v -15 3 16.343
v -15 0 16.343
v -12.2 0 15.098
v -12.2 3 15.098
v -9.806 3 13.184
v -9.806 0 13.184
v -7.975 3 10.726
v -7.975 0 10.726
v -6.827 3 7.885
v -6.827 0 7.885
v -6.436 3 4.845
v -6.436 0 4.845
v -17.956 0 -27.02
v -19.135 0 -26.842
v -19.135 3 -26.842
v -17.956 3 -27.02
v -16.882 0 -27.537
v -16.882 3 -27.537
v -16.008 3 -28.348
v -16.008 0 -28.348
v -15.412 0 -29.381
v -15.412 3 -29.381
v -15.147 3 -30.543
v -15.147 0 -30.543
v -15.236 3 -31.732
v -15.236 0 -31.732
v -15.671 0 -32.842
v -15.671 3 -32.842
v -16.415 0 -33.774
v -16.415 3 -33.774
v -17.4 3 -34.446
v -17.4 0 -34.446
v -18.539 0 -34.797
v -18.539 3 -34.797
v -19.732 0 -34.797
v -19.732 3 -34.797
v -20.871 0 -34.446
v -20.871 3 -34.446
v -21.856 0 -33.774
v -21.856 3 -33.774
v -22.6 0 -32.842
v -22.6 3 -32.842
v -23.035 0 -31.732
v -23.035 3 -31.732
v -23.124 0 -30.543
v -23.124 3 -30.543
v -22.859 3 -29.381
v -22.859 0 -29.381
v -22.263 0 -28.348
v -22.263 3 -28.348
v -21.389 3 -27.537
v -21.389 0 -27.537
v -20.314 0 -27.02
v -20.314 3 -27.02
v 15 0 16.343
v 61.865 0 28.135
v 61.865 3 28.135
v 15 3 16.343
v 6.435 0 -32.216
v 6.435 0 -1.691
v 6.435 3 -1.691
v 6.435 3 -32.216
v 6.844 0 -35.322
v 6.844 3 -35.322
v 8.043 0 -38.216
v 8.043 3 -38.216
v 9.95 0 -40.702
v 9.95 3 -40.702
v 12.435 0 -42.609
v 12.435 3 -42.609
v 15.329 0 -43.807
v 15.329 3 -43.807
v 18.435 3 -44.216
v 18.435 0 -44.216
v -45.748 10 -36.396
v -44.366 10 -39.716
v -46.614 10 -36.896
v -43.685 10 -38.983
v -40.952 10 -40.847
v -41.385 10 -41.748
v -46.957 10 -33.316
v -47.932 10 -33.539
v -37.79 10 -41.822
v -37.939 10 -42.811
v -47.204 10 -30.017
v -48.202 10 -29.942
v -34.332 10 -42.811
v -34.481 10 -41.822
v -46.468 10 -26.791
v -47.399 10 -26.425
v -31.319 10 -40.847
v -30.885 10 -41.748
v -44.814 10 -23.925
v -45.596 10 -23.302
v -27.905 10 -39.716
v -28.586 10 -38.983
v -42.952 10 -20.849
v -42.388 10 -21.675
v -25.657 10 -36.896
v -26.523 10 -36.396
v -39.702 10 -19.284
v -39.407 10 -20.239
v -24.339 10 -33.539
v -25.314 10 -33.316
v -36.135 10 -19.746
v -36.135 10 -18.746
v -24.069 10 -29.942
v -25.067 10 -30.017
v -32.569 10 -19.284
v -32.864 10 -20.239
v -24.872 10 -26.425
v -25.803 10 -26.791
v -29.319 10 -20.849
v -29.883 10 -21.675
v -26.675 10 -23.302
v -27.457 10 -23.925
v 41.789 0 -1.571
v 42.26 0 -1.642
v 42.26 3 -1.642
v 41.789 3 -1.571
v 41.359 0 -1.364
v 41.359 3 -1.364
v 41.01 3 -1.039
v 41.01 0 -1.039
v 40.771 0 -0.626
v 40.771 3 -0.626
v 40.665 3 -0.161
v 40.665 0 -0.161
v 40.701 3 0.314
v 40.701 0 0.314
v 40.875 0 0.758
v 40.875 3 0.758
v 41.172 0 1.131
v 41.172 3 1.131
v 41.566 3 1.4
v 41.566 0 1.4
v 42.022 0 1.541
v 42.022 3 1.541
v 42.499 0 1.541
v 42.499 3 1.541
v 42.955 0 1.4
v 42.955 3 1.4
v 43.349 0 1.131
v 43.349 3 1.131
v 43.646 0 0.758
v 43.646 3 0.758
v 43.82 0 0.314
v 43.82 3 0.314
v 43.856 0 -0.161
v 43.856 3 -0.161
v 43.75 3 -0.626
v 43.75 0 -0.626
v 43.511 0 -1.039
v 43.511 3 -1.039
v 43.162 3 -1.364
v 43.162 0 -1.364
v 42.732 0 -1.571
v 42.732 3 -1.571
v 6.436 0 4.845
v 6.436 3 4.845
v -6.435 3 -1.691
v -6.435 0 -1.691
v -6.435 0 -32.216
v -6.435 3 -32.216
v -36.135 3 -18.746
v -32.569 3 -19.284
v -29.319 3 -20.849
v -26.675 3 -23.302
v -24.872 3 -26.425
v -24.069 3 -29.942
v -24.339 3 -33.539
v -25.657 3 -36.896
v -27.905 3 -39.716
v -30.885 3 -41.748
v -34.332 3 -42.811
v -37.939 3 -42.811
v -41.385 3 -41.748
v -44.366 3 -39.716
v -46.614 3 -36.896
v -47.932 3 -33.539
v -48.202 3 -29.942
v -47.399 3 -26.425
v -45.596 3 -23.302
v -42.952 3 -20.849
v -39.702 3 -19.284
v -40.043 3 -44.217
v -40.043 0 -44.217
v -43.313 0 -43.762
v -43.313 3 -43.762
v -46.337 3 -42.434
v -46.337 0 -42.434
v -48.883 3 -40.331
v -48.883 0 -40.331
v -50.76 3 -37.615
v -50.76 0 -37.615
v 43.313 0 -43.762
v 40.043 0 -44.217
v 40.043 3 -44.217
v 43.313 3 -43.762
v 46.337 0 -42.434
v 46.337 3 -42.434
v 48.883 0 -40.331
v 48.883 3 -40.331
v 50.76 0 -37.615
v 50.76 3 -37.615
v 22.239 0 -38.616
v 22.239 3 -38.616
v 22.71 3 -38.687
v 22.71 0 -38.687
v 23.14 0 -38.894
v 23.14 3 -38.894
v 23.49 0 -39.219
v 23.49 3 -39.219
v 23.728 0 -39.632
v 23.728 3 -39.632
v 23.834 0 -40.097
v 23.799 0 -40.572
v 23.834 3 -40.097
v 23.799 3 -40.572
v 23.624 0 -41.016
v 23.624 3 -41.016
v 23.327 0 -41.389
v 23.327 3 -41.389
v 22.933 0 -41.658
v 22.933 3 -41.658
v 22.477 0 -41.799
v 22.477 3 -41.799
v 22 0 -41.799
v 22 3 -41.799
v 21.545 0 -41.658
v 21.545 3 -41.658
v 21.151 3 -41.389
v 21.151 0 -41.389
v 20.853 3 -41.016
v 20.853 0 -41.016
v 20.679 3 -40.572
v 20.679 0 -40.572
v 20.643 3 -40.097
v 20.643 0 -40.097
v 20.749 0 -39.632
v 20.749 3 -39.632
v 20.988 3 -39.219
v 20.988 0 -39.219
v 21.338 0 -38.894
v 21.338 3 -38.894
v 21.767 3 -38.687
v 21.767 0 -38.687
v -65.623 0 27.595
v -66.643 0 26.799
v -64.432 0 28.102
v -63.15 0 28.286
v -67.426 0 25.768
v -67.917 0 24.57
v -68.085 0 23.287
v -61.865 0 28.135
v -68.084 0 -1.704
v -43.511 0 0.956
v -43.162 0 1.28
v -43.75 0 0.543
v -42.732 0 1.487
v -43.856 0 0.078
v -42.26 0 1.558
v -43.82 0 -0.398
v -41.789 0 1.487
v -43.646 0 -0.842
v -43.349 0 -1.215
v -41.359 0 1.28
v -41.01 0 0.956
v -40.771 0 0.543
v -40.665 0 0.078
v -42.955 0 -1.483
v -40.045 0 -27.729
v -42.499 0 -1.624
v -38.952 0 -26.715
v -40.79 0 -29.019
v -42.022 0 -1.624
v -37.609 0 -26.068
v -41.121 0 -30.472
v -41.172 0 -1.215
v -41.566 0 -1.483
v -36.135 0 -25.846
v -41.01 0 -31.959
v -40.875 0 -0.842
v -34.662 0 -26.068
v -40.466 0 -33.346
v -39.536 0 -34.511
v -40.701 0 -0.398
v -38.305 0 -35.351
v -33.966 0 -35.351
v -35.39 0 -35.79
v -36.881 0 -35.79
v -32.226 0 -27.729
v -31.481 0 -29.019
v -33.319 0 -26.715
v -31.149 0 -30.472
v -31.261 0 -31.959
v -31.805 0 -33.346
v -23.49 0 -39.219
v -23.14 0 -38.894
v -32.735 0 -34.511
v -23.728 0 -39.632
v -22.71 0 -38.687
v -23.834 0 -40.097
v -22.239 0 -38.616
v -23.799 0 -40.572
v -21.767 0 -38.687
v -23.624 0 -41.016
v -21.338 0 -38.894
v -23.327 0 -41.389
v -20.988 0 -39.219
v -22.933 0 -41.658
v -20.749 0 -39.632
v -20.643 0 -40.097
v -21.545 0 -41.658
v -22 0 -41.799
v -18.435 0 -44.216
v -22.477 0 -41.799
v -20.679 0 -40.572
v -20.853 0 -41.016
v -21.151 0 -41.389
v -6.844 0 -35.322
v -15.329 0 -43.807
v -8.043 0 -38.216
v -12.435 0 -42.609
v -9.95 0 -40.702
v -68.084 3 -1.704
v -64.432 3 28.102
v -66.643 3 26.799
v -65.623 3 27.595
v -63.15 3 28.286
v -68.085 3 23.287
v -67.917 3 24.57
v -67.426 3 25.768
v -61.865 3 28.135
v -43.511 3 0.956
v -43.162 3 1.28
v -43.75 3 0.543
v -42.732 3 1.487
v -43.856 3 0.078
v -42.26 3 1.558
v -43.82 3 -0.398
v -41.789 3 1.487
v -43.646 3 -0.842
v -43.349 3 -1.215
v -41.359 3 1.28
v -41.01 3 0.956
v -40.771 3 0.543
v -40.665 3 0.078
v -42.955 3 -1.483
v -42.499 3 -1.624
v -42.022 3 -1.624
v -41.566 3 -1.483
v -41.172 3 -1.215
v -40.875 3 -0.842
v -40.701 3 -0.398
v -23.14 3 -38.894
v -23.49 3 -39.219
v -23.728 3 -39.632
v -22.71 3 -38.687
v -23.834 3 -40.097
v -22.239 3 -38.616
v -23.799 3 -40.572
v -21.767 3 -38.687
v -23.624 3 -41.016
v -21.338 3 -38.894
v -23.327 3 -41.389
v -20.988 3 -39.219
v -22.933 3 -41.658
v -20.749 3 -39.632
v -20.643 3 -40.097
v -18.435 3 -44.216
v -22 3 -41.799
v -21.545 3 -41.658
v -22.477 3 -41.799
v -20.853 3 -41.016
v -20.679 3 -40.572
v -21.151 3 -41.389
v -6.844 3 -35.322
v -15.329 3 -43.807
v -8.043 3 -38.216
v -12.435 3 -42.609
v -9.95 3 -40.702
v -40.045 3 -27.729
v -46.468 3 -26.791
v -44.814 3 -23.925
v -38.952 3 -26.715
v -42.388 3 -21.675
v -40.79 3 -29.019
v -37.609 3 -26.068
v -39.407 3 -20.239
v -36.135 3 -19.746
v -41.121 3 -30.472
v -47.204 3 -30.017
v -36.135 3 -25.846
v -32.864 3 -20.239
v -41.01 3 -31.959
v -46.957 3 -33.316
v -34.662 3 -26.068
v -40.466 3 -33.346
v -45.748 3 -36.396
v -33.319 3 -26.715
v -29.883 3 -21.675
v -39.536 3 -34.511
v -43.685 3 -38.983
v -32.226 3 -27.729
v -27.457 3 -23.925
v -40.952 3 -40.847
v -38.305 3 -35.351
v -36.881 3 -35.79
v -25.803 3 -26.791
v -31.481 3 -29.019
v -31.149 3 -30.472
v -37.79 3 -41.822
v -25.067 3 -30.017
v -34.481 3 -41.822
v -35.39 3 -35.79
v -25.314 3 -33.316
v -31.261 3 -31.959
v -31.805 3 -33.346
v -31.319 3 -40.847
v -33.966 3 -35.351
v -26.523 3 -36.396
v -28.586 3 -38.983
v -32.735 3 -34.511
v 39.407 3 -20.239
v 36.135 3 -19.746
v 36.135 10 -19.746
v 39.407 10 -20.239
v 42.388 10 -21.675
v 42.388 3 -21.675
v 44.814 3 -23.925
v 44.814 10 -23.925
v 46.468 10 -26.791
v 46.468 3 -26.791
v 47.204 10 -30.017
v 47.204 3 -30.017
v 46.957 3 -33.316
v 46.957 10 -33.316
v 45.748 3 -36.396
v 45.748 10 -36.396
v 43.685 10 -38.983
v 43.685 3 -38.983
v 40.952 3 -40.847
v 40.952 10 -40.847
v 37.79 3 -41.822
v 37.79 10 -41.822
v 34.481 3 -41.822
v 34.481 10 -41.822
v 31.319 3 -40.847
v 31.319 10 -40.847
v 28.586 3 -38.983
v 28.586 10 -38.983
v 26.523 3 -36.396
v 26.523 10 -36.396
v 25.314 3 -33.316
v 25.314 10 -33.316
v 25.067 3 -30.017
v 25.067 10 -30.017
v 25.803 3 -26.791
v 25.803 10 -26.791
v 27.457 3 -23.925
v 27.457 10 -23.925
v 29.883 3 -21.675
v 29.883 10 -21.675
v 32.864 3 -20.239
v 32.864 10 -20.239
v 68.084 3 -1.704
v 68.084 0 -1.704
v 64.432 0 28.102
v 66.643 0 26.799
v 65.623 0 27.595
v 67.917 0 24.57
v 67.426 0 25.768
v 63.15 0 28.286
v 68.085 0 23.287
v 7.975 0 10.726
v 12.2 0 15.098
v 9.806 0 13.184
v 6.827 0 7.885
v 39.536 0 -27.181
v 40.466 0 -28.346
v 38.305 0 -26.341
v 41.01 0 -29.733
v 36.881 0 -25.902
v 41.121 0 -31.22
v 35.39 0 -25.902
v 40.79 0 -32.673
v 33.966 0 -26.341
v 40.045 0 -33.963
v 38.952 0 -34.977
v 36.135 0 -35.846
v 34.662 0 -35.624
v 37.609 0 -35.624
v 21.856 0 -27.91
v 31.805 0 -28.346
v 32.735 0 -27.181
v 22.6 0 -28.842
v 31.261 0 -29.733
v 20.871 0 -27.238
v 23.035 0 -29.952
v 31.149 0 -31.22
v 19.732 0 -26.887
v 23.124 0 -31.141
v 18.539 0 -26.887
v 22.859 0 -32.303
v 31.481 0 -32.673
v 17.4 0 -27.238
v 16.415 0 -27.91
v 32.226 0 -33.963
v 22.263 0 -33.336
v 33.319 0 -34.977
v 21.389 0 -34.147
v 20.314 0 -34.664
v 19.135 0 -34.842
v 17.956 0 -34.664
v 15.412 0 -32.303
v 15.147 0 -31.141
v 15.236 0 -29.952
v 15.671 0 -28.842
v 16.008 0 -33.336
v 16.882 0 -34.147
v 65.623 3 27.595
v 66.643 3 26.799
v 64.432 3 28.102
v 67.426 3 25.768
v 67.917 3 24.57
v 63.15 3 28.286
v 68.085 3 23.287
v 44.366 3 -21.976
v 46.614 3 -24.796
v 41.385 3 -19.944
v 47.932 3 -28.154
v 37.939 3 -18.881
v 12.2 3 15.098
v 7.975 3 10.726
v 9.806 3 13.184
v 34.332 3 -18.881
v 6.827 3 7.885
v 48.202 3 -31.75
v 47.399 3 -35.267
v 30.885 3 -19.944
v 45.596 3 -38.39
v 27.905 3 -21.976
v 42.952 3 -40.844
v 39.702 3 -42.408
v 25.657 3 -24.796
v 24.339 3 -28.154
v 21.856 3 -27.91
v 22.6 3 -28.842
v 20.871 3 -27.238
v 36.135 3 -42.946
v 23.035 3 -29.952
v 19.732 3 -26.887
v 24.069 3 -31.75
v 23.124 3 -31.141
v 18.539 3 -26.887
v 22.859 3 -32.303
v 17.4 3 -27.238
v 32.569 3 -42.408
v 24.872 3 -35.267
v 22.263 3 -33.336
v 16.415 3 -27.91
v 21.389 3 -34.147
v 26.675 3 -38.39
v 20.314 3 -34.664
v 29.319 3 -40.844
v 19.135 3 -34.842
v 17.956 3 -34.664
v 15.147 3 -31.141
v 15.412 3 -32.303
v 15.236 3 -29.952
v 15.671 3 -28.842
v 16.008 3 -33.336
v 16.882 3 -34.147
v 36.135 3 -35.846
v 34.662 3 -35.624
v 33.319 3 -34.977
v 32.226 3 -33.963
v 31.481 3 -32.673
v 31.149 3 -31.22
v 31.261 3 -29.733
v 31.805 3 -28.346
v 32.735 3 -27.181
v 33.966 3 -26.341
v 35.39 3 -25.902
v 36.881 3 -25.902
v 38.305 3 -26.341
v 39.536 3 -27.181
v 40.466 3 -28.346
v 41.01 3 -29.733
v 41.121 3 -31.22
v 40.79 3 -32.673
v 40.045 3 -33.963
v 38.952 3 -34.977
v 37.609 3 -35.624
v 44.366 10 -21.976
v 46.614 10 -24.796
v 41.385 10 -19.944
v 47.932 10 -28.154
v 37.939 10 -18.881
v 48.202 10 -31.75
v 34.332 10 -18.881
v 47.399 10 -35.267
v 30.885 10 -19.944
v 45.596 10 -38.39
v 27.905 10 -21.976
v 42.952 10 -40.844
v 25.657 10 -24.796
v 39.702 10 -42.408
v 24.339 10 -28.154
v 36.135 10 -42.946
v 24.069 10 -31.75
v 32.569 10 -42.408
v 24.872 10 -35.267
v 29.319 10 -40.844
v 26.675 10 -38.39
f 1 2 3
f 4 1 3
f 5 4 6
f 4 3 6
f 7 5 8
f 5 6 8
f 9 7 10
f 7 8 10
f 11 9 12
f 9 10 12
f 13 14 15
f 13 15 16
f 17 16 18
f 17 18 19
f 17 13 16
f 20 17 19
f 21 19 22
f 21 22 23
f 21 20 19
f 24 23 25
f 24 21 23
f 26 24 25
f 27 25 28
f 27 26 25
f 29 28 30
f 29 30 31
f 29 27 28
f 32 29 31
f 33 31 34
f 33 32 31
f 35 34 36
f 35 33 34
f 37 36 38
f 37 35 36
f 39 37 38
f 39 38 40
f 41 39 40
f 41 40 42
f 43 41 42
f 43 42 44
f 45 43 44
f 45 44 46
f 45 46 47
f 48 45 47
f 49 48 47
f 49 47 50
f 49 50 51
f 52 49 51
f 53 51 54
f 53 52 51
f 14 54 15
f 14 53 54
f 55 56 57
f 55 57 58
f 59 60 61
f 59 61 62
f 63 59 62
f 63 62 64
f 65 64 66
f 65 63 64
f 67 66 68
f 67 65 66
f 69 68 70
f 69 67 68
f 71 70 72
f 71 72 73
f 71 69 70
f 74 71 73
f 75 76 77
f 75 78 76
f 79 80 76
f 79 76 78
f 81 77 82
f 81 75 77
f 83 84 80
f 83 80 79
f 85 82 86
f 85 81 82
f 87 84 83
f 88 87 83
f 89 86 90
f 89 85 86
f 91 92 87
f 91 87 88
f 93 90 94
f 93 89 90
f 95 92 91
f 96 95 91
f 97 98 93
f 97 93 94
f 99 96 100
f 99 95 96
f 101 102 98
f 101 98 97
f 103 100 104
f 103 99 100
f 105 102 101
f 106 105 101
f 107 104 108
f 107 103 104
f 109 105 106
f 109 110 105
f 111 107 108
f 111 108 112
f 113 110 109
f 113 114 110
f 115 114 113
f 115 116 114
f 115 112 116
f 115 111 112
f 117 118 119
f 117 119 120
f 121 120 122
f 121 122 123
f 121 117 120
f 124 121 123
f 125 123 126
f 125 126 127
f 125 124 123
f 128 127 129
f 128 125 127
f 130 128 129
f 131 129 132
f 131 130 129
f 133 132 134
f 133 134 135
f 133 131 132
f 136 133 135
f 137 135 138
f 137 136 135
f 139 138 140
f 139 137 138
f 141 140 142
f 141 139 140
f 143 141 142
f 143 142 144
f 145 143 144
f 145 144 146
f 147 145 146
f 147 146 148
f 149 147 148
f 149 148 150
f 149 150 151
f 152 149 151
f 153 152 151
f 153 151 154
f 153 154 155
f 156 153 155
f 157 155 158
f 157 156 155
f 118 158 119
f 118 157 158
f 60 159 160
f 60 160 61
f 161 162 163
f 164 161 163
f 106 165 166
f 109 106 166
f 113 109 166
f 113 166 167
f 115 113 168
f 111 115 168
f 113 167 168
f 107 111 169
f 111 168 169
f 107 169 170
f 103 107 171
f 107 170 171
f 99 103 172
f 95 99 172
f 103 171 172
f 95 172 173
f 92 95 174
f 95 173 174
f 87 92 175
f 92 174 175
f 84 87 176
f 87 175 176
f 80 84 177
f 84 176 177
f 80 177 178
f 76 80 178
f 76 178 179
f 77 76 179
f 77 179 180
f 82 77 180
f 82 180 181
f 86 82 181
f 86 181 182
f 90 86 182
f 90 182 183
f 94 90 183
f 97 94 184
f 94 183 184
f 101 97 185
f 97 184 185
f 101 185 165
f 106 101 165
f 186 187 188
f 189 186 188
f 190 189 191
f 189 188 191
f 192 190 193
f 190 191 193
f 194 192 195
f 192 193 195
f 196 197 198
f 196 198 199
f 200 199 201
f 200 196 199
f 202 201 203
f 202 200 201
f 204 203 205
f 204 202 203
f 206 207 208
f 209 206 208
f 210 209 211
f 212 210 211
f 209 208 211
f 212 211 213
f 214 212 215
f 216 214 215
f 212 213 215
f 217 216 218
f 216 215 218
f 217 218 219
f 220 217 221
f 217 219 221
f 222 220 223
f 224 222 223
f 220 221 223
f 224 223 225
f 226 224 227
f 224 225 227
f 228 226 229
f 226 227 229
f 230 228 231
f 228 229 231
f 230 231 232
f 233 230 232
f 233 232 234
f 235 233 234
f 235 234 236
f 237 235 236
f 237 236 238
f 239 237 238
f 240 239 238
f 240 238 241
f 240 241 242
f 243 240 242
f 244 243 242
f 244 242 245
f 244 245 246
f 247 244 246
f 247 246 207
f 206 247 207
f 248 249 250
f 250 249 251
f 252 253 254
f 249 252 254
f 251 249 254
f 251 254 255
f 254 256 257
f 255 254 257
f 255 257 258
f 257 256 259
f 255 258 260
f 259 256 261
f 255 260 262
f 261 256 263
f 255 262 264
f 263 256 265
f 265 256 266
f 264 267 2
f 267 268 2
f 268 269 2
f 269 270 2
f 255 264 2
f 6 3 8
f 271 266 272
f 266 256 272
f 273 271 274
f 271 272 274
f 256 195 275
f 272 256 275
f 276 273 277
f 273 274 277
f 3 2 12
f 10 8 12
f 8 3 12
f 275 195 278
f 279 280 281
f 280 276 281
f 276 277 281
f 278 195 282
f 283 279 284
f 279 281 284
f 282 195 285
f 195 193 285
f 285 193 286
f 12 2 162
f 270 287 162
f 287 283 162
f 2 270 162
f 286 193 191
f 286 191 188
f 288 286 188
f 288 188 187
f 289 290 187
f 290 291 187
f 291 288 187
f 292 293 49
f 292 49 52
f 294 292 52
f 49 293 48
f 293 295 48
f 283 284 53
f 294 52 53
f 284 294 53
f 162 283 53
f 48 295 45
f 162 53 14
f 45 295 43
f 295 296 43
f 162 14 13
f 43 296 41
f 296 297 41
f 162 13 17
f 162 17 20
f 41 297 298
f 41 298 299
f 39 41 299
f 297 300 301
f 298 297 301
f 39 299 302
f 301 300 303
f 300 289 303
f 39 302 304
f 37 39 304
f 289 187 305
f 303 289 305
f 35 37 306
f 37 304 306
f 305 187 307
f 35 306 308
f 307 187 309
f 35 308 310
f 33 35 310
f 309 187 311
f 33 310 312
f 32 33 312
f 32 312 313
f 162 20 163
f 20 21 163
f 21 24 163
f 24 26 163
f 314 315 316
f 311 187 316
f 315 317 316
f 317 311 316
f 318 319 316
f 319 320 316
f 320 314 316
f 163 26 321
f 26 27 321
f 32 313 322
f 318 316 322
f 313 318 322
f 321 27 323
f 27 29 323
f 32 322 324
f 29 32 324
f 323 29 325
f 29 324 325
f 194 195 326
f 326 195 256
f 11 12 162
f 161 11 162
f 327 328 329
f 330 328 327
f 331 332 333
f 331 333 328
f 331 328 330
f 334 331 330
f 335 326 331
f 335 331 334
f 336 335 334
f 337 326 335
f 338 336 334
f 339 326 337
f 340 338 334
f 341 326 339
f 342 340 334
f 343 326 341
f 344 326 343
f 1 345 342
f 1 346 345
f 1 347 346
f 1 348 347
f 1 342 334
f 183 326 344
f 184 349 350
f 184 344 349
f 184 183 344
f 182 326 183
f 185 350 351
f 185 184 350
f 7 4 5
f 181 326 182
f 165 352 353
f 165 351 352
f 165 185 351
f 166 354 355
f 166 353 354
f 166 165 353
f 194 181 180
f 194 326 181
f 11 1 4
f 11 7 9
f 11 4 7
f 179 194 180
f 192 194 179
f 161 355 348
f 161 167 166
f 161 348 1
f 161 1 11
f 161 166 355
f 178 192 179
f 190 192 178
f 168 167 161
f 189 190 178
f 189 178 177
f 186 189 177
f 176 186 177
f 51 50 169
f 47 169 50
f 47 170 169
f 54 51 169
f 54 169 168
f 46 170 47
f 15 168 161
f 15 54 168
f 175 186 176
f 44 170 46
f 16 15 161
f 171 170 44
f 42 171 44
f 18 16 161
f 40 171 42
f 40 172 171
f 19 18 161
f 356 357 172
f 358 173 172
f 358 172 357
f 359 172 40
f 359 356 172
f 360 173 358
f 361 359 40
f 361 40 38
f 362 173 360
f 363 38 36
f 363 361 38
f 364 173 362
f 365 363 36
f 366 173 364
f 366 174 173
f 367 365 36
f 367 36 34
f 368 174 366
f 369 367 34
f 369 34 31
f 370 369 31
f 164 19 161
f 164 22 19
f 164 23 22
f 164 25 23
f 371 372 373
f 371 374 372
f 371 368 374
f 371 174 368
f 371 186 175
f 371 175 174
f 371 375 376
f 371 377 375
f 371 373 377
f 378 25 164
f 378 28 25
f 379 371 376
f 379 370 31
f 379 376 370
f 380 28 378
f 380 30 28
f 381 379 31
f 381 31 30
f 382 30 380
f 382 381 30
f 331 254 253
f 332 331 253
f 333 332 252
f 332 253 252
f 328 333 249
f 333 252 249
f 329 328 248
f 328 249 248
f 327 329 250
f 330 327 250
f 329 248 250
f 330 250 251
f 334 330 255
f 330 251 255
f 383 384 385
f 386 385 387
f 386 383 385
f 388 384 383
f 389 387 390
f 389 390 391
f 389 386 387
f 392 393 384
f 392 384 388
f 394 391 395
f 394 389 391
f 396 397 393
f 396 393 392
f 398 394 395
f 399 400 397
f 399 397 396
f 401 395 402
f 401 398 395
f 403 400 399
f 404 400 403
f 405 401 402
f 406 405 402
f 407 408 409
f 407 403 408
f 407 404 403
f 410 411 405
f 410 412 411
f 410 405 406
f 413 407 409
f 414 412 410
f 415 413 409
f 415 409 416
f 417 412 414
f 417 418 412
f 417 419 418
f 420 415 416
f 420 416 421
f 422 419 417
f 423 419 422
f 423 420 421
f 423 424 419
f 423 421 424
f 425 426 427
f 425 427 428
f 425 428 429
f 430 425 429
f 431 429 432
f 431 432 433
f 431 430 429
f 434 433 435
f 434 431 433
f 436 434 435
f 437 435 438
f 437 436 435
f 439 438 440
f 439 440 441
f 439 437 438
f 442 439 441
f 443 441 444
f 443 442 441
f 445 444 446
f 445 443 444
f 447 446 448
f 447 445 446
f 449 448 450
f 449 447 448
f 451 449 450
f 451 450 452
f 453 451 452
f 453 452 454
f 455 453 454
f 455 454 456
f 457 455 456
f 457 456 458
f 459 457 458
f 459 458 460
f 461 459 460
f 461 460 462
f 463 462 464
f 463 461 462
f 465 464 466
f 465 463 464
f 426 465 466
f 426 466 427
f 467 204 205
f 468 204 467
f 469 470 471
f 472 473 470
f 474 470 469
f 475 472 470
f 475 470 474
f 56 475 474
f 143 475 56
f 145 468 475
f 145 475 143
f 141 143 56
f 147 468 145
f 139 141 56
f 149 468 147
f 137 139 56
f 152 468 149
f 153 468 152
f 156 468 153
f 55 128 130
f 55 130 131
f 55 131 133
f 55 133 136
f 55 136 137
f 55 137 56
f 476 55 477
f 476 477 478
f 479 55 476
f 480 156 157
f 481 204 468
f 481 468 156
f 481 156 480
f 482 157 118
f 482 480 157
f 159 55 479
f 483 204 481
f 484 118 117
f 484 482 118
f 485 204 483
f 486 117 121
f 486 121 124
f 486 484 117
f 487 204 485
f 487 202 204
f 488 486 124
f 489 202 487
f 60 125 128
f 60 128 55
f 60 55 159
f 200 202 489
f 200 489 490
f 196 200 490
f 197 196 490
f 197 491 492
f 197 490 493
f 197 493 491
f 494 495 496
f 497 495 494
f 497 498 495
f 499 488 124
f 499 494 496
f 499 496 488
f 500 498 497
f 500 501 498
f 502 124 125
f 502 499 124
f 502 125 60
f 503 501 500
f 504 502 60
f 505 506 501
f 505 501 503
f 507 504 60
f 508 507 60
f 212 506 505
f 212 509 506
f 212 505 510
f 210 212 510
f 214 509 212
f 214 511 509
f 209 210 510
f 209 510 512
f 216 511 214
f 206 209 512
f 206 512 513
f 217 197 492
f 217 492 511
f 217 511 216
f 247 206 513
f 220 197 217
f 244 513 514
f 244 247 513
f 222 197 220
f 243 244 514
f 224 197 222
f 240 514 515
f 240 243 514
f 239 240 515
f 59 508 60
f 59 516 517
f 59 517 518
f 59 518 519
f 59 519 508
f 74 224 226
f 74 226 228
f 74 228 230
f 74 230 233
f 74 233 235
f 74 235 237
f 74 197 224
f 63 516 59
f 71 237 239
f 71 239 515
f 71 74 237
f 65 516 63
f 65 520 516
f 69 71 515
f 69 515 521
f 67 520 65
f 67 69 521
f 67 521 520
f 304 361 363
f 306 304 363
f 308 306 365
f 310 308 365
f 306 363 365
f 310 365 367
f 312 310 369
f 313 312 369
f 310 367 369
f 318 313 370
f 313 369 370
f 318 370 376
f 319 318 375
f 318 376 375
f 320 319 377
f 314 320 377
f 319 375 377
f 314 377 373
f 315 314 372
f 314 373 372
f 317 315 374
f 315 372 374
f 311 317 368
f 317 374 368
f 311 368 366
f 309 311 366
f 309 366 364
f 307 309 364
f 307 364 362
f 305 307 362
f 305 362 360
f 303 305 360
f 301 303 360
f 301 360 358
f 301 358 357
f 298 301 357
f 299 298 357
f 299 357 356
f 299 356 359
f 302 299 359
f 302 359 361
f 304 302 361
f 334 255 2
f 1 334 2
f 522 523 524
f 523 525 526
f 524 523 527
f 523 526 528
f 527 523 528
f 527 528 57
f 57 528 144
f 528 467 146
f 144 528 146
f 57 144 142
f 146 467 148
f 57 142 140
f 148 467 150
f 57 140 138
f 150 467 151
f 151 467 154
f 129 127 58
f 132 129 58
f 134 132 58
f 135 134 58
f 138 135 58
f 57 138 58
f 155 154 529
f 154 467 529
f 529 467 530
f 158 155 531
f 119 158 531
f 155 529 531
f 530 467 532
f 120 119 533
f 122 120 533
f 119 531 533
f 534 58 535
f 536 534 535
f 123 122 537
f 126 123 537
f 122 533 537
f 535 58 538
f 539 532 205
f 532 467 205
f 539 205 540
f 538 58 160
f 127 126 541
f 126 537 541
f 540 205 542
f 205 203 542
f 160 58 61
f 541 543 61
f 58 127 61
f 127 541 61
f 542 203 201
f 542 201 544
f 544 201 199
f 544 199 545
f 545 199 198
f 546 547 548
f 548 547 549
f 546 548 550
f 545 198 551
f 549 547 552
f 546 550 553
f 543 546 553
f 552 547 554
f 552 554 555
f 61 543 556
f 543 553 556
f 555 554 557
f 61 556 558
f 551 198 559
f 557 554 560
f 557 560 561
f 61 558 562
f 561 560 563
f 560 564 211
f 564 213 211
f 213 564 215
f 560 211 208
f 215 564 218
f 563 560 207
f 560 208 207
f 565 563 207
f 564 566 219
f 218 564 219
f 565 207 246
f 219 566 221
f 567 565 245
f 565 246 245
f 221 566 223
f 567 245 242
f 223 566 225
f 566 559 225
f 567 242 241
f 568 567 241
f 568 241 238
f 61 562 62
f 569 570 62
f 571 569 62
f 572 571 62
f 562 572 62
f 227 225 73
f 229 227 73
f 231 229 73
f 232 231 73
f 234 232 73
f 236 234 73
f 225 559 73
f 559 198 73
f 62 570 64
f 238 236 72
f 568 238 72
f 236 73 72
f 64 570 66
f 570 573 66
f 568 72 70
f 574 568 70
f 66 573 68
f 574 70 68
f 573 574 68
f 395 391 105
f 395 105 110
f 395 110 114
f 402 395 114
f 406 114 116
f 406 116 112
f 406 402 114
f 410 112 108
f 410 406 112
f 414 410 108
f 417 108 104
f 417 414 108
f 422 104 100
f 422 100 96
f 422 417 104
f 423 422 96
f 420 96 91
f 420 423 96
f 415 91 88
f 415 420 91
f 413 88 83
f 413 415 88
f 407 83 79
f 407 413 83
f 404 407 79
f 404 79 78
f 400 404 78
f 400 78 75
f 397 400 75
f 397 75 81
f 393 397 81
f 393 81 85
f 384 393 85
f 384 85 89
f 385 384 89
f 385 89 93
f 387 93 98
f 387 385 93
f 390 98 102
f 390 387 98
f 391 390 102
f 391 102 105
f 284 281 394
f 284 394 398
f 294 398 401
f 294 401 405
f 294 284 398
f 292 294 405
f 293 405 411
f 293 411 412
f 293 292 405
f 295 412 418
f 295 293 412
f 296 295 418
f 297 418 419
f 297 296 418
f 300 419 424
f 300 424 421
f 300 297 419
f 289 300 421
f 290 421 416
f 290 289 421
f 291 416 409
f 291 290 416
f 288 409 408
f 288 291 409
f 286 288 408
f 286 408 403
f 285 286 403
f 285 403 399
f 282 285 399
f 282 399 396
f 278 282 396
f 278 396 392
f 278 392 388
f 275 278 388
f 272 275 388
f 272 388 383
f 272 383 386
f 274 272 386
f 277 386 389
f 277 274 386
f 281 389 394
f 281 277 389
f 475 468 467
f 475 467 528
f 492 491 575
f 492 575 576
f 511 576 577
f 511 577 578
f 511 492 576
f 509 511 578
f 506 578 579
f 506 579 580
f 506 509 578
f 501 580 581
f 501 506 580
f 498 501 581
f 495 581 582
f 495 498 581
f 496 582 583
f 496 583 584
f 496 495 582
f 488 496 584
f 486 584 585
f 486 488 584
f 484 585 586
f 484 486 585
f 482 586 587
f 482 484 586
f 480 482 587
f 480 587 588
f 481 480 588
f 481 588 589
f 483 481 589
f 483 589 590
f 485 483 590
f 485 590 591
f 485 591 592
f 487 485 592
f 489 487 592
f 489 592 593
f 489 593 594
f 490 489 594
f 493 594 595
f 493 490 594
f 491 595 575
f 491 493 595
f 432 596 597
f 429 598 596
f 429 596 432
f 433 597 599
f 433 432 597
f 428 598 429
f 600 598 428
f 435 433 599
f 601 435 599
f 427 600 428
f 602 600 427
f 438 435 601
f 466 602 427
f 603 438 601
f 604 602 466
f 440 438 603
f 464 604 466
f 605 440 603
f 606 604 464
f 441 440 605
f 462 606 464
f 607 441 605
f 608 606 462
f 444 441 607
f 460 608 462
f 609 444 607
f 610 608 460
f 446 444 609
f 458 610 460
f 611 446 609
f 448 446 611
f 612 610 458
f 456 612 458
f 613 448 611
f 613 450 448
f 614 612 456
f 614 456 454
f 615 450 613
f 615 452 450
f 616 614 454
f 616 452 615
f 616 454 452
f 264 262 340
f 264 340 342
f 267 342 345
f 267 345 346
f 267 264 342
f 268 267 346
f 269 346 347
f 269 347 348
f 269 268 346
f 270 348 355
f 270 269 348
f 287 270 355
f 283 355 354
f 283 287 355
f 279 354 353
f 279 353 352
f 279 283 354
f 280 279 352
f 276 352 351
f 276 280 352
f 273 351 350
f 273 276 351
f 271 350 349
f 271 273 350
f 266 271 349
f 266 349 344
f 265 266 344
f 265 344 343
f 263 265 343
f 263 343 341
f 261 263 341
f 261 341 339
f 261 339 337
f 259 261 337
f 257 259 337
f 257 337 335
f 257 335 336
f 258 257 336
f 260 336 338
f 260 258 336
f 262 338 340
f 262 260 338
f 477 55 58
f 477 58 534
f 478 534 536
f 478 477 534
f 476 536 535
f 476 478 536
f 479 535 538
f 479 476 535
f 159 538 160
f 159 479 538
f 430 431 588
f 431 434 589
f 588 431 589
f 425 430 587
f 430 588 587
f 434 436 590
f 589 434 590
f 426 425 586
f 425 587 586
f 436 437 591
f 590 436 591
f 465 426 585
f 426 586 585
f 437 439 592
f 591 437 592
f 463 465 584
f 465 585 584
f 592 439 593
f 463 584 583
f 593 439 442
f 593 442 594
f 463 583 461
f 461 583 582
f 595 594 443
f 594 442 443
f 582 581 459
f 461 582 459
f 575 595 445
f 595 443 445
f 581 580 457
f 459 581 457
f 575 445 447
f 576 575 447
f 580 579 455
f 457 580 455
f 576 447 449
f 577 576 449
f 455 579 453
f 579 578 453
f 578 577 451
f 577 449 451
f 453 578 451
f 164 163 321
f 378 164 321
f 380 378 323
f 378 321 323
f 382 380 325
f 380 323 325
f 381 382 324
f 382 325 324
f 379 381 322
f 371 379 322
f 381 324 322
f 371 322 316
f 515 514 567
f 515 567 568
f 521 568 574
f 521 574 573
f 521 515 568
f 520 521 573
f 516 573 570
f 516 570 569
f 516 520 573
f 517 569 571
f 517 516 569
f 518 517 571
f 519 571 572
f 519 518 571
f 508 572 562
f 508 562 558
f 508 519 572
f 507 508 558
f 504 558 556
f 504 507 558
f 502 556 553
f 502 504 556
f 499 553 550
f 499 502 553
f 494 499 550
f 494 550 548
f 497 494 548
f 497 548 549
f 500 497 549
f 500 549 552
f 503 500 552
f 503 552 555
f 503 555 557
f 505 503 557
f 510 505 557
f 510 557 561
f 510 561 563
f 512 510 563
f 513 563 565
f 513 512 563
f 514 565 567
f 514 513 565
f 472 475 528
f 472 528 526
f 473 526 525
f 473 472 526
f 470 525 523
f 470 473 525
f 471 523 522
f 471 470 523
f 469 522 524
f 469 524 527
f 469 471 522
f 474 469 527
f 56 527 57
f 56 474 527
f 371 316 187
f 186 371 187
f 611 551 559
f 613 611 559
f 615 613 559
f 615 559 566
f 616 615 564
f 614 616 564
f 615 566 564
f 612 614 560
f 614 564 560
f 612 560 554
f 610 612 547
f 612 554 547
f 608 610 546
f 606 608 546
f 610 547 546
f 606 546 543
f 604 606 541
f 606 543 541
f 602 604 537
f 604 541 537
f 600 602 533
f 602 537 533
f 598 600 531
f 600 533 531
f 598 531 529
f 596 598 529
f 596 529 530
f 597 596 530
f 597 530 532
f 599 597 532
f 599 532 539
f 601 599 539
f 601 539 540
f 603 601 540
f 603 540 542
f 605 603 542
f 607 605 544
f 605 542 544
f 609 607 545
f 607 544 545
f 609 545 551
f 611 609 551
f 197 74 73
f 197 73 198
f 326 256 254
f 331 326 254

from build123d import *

# Parameters (mm, degrees)
IZIM1_R                       = 5
IZIM1_R_2                     = 4
IZIM1_R_3                     = 1.6
Y_KSEKLIK_EKSTR_ZYON2_DEPTH   = 3
Y_KSEKLIK_EKSTR_ZYON2_2_DEPTH = 3
IZIM2_R                       = 12.1
IZIM2_R_2                     = 11.1
Y_KSEKLIK_EKSTR_ZYON3_DEPTH   = 7
IZIM3_R                       = 12.1
IZIM3_R_2                     = 11.1
Y_KSEKLIK_EKSTR_ZYON4_DEPTH   = 7
IZIM4_R                       = 1.6
KES_EKSTR_ZYON1_DEPTH         = 82.484022533
IZIM5_R                       = 1.6
KES_EKSTR_ZYON2_DEPTH         = 82.484022533


with BuildPart() as part:
    # Çizim1 → Yükseklik-Ekstrüzyon2 (new body)
    with BuildSketch(Plane(origin=(0, 0, 0), x_dir=(1, 0, 0), z_dir=(0, 1, 0))):
        with BuildLine():
            Line((-68.084299237, 1.703943313), (-68.084797964, -23.286509948))
            ThreePointArc((-68.084797964, -23.286509948), (-66.158876869, -27.229963494), (-61.864685641, -28.135457628))
            Line((-61.864685641, -28.135457628), (-14.999890892, -16.342900955))
            ThreePointArc((-14.999890892, -16.342900955), (-8.811960476, -12.013704596), (-6.435524315, -4.845373191))
            Line((-6.435524315, -4.845373191), (-6.435446445, 1.690953534))
            Line((-6.435446445, 1.690953534), (-6.435084331, 32.216193937))
            ThreePointArc((-6.435084331, 32.216193937), (-9.949698317, 40.70150849), (-18.434929196, 44.216326031))
            Line((-18.434929196, 44.216326031), (-40.042731838, 44.216583023))
            ThreePointArc((-40.042731838, 44.216583023), (-46.336600031, 42.43367707), (-50.760203342, 37.61462486))
            Line((-50.760203342, 37.61462486), (-68.084299237, 1.703943313))
        make_face()
        with Locations(Location((-36.135474475, 30.846047168, 0), (0, 0, 270))):
            Circle(IZIM1_R, mode=Mode.SUBTRACT)
        with Locations(Location((-19.13547597, 30.841945567, 0), (0, 0, 270))):
            Circle(IZIM1_R_2, mode=Mode.SUBTRACT)
        with Locations(Location((-42.260458863, 0.041620293, 0), (0, 0, 270))):
            Circle(IZIM1_R_3, mode=Mode.SUBTRACT)
    extrude(amount=Y_KSEKLIK_EKSTR_ZYON2_DEPTH)

    # Çizim2 → Yükseklik-Ekstrüzyon3 (add)
    with BuildSketch(Plane(origin=(0, 3, 0), x_dir=(1, 0, 0), z_dir=(0, 1, 0))):
        with Locations(Location((-36.135474475, 30.846047168, 0), (0, 0, 270))):
            Circle(IZIM2_R)
        with Locations(Location((-36.135474475, 30.846047168, 0), (0, 0, 270))):
            Circle(IZIM2_R_2, mode=Mode.SUBTRACT)
    extrude(amount=Y_KSEKLIK_EKSTR_ZYON3_DEPTH)

    # Çizim4 → Kes-Ekstrüzyon1 (cut, through all)
    with BuildSketch(Plane(origin=(0, 3, 0), x_dir=(1, 0, 0), z_dir=(0, 1, 0))):
        with Locations(Location((-22.238830517, 40.216371272, 0), (0, 0, 270))):
            Circle(IZIM4_R)
    extrude(amount=-KES_EKSTR_ZYON1_DEPTH, mode=Mode.SUBTRACT)


with BuildPart() as body_2:
    # Çizim1 → Y_kseklik-Ekstr_zyon2 2 (new body)
    with BuildSketch(Plane(origin=(0, 0, 0), x_dir=(1, 0, 0), z_dir=(0, 1, 0))):
        with BuildLine():
            Line((50.760203342, 37.61462486), (68.084299237, 1.703943313))
            Line((68.084299237, 1.703943313), (68.084797964, -23.286509948))
            ThreePointArc((68.084797964, -23.286509948), (66.158876869, -27.229963494), (61.864685641, -28.135457628))
            Line((61.864685641, -28.135457628), (14.999890892, -16.342900955))
            ThreePointArc((14.999890892, -16.342900955), (8.811960476, -12.013704596), (6.435524315, -4.845373191))
            Line((6.435524315, -4.845373191), (6.435446445, 1.690953534))
            Line((6.435446445, 1.690953534), (6.435084331, 32.216193937))
            ThreePointArc((6.435084331, 32.216193937), (9.949698317, 40.70150849), (18.434929196, 44.216326031))
            Line((18.434929196, 44.216326031), (40.042731838, 44.216583023))
            ThreePointArc((40.042731838, 44.216583023), (46.336600031, 42.43367707), (50.760203342, 37.61462486))
        make_face()
        with Locations(Location((42.260458863, 0.041620293, 0), (0, 0, 90))):
            Circle(IZIM1_R_3, mode=Mode.SUBTRACT)
        with Locations(Location((19.13547597, 30.841945567, 0), (0, 0, 90))):
            Circle(IZIM1_R_2, mode=Mode.SUBTRACT)
        with Locations(Location((36.135474475, 30.846047168, 0), (0, 0, 90))):
            Circle(IZIM1_R, mode=Mode.SUBTRACT)
    extrude(amount=Y_KSEKLIK_EKSTR_ZYON2_2_DEPTH)

    # Çizim3 → Yükseklik-Ekstrüzyon4 (add)
    with BuildSketch(Plane(origin=(0, 3, 0), x_dir=(1, 0, 0), z_dir=(0, 1, 0))):
        with Locations(Location((36.135474475, 30.846047168, 0), (0, 0, 90))):
            Circle(IZIM3_R)
        with Locations(Location((36.135474475, 30.846047168, 0), (0, 0, 270))):
            Circle(IZIM3_R_2, mode=Mode.SUBTRACT)
    extrude(amount=Y_KSEKLIK_EKSTR_ZYON4_DEPTH)

    # Çizim5 → Kes-Ekstrüzyon2 (cut, through all)
    with BuildSketch(Plane(origin=(0, 3, 0), x_dir=(1, 0, 0), z_dir=(0, 1, 0))):
        with Locations(Location((22.238830517, 40.216371272, 0), (0, 0, 270))):
            Circle(IZIM5_R)
    extrude(amount=-KES_EKSTR_ZYON2_DEPTH, mode=Mode.SUBTRACT)


solid = Compound([part.part, body_2.part])
